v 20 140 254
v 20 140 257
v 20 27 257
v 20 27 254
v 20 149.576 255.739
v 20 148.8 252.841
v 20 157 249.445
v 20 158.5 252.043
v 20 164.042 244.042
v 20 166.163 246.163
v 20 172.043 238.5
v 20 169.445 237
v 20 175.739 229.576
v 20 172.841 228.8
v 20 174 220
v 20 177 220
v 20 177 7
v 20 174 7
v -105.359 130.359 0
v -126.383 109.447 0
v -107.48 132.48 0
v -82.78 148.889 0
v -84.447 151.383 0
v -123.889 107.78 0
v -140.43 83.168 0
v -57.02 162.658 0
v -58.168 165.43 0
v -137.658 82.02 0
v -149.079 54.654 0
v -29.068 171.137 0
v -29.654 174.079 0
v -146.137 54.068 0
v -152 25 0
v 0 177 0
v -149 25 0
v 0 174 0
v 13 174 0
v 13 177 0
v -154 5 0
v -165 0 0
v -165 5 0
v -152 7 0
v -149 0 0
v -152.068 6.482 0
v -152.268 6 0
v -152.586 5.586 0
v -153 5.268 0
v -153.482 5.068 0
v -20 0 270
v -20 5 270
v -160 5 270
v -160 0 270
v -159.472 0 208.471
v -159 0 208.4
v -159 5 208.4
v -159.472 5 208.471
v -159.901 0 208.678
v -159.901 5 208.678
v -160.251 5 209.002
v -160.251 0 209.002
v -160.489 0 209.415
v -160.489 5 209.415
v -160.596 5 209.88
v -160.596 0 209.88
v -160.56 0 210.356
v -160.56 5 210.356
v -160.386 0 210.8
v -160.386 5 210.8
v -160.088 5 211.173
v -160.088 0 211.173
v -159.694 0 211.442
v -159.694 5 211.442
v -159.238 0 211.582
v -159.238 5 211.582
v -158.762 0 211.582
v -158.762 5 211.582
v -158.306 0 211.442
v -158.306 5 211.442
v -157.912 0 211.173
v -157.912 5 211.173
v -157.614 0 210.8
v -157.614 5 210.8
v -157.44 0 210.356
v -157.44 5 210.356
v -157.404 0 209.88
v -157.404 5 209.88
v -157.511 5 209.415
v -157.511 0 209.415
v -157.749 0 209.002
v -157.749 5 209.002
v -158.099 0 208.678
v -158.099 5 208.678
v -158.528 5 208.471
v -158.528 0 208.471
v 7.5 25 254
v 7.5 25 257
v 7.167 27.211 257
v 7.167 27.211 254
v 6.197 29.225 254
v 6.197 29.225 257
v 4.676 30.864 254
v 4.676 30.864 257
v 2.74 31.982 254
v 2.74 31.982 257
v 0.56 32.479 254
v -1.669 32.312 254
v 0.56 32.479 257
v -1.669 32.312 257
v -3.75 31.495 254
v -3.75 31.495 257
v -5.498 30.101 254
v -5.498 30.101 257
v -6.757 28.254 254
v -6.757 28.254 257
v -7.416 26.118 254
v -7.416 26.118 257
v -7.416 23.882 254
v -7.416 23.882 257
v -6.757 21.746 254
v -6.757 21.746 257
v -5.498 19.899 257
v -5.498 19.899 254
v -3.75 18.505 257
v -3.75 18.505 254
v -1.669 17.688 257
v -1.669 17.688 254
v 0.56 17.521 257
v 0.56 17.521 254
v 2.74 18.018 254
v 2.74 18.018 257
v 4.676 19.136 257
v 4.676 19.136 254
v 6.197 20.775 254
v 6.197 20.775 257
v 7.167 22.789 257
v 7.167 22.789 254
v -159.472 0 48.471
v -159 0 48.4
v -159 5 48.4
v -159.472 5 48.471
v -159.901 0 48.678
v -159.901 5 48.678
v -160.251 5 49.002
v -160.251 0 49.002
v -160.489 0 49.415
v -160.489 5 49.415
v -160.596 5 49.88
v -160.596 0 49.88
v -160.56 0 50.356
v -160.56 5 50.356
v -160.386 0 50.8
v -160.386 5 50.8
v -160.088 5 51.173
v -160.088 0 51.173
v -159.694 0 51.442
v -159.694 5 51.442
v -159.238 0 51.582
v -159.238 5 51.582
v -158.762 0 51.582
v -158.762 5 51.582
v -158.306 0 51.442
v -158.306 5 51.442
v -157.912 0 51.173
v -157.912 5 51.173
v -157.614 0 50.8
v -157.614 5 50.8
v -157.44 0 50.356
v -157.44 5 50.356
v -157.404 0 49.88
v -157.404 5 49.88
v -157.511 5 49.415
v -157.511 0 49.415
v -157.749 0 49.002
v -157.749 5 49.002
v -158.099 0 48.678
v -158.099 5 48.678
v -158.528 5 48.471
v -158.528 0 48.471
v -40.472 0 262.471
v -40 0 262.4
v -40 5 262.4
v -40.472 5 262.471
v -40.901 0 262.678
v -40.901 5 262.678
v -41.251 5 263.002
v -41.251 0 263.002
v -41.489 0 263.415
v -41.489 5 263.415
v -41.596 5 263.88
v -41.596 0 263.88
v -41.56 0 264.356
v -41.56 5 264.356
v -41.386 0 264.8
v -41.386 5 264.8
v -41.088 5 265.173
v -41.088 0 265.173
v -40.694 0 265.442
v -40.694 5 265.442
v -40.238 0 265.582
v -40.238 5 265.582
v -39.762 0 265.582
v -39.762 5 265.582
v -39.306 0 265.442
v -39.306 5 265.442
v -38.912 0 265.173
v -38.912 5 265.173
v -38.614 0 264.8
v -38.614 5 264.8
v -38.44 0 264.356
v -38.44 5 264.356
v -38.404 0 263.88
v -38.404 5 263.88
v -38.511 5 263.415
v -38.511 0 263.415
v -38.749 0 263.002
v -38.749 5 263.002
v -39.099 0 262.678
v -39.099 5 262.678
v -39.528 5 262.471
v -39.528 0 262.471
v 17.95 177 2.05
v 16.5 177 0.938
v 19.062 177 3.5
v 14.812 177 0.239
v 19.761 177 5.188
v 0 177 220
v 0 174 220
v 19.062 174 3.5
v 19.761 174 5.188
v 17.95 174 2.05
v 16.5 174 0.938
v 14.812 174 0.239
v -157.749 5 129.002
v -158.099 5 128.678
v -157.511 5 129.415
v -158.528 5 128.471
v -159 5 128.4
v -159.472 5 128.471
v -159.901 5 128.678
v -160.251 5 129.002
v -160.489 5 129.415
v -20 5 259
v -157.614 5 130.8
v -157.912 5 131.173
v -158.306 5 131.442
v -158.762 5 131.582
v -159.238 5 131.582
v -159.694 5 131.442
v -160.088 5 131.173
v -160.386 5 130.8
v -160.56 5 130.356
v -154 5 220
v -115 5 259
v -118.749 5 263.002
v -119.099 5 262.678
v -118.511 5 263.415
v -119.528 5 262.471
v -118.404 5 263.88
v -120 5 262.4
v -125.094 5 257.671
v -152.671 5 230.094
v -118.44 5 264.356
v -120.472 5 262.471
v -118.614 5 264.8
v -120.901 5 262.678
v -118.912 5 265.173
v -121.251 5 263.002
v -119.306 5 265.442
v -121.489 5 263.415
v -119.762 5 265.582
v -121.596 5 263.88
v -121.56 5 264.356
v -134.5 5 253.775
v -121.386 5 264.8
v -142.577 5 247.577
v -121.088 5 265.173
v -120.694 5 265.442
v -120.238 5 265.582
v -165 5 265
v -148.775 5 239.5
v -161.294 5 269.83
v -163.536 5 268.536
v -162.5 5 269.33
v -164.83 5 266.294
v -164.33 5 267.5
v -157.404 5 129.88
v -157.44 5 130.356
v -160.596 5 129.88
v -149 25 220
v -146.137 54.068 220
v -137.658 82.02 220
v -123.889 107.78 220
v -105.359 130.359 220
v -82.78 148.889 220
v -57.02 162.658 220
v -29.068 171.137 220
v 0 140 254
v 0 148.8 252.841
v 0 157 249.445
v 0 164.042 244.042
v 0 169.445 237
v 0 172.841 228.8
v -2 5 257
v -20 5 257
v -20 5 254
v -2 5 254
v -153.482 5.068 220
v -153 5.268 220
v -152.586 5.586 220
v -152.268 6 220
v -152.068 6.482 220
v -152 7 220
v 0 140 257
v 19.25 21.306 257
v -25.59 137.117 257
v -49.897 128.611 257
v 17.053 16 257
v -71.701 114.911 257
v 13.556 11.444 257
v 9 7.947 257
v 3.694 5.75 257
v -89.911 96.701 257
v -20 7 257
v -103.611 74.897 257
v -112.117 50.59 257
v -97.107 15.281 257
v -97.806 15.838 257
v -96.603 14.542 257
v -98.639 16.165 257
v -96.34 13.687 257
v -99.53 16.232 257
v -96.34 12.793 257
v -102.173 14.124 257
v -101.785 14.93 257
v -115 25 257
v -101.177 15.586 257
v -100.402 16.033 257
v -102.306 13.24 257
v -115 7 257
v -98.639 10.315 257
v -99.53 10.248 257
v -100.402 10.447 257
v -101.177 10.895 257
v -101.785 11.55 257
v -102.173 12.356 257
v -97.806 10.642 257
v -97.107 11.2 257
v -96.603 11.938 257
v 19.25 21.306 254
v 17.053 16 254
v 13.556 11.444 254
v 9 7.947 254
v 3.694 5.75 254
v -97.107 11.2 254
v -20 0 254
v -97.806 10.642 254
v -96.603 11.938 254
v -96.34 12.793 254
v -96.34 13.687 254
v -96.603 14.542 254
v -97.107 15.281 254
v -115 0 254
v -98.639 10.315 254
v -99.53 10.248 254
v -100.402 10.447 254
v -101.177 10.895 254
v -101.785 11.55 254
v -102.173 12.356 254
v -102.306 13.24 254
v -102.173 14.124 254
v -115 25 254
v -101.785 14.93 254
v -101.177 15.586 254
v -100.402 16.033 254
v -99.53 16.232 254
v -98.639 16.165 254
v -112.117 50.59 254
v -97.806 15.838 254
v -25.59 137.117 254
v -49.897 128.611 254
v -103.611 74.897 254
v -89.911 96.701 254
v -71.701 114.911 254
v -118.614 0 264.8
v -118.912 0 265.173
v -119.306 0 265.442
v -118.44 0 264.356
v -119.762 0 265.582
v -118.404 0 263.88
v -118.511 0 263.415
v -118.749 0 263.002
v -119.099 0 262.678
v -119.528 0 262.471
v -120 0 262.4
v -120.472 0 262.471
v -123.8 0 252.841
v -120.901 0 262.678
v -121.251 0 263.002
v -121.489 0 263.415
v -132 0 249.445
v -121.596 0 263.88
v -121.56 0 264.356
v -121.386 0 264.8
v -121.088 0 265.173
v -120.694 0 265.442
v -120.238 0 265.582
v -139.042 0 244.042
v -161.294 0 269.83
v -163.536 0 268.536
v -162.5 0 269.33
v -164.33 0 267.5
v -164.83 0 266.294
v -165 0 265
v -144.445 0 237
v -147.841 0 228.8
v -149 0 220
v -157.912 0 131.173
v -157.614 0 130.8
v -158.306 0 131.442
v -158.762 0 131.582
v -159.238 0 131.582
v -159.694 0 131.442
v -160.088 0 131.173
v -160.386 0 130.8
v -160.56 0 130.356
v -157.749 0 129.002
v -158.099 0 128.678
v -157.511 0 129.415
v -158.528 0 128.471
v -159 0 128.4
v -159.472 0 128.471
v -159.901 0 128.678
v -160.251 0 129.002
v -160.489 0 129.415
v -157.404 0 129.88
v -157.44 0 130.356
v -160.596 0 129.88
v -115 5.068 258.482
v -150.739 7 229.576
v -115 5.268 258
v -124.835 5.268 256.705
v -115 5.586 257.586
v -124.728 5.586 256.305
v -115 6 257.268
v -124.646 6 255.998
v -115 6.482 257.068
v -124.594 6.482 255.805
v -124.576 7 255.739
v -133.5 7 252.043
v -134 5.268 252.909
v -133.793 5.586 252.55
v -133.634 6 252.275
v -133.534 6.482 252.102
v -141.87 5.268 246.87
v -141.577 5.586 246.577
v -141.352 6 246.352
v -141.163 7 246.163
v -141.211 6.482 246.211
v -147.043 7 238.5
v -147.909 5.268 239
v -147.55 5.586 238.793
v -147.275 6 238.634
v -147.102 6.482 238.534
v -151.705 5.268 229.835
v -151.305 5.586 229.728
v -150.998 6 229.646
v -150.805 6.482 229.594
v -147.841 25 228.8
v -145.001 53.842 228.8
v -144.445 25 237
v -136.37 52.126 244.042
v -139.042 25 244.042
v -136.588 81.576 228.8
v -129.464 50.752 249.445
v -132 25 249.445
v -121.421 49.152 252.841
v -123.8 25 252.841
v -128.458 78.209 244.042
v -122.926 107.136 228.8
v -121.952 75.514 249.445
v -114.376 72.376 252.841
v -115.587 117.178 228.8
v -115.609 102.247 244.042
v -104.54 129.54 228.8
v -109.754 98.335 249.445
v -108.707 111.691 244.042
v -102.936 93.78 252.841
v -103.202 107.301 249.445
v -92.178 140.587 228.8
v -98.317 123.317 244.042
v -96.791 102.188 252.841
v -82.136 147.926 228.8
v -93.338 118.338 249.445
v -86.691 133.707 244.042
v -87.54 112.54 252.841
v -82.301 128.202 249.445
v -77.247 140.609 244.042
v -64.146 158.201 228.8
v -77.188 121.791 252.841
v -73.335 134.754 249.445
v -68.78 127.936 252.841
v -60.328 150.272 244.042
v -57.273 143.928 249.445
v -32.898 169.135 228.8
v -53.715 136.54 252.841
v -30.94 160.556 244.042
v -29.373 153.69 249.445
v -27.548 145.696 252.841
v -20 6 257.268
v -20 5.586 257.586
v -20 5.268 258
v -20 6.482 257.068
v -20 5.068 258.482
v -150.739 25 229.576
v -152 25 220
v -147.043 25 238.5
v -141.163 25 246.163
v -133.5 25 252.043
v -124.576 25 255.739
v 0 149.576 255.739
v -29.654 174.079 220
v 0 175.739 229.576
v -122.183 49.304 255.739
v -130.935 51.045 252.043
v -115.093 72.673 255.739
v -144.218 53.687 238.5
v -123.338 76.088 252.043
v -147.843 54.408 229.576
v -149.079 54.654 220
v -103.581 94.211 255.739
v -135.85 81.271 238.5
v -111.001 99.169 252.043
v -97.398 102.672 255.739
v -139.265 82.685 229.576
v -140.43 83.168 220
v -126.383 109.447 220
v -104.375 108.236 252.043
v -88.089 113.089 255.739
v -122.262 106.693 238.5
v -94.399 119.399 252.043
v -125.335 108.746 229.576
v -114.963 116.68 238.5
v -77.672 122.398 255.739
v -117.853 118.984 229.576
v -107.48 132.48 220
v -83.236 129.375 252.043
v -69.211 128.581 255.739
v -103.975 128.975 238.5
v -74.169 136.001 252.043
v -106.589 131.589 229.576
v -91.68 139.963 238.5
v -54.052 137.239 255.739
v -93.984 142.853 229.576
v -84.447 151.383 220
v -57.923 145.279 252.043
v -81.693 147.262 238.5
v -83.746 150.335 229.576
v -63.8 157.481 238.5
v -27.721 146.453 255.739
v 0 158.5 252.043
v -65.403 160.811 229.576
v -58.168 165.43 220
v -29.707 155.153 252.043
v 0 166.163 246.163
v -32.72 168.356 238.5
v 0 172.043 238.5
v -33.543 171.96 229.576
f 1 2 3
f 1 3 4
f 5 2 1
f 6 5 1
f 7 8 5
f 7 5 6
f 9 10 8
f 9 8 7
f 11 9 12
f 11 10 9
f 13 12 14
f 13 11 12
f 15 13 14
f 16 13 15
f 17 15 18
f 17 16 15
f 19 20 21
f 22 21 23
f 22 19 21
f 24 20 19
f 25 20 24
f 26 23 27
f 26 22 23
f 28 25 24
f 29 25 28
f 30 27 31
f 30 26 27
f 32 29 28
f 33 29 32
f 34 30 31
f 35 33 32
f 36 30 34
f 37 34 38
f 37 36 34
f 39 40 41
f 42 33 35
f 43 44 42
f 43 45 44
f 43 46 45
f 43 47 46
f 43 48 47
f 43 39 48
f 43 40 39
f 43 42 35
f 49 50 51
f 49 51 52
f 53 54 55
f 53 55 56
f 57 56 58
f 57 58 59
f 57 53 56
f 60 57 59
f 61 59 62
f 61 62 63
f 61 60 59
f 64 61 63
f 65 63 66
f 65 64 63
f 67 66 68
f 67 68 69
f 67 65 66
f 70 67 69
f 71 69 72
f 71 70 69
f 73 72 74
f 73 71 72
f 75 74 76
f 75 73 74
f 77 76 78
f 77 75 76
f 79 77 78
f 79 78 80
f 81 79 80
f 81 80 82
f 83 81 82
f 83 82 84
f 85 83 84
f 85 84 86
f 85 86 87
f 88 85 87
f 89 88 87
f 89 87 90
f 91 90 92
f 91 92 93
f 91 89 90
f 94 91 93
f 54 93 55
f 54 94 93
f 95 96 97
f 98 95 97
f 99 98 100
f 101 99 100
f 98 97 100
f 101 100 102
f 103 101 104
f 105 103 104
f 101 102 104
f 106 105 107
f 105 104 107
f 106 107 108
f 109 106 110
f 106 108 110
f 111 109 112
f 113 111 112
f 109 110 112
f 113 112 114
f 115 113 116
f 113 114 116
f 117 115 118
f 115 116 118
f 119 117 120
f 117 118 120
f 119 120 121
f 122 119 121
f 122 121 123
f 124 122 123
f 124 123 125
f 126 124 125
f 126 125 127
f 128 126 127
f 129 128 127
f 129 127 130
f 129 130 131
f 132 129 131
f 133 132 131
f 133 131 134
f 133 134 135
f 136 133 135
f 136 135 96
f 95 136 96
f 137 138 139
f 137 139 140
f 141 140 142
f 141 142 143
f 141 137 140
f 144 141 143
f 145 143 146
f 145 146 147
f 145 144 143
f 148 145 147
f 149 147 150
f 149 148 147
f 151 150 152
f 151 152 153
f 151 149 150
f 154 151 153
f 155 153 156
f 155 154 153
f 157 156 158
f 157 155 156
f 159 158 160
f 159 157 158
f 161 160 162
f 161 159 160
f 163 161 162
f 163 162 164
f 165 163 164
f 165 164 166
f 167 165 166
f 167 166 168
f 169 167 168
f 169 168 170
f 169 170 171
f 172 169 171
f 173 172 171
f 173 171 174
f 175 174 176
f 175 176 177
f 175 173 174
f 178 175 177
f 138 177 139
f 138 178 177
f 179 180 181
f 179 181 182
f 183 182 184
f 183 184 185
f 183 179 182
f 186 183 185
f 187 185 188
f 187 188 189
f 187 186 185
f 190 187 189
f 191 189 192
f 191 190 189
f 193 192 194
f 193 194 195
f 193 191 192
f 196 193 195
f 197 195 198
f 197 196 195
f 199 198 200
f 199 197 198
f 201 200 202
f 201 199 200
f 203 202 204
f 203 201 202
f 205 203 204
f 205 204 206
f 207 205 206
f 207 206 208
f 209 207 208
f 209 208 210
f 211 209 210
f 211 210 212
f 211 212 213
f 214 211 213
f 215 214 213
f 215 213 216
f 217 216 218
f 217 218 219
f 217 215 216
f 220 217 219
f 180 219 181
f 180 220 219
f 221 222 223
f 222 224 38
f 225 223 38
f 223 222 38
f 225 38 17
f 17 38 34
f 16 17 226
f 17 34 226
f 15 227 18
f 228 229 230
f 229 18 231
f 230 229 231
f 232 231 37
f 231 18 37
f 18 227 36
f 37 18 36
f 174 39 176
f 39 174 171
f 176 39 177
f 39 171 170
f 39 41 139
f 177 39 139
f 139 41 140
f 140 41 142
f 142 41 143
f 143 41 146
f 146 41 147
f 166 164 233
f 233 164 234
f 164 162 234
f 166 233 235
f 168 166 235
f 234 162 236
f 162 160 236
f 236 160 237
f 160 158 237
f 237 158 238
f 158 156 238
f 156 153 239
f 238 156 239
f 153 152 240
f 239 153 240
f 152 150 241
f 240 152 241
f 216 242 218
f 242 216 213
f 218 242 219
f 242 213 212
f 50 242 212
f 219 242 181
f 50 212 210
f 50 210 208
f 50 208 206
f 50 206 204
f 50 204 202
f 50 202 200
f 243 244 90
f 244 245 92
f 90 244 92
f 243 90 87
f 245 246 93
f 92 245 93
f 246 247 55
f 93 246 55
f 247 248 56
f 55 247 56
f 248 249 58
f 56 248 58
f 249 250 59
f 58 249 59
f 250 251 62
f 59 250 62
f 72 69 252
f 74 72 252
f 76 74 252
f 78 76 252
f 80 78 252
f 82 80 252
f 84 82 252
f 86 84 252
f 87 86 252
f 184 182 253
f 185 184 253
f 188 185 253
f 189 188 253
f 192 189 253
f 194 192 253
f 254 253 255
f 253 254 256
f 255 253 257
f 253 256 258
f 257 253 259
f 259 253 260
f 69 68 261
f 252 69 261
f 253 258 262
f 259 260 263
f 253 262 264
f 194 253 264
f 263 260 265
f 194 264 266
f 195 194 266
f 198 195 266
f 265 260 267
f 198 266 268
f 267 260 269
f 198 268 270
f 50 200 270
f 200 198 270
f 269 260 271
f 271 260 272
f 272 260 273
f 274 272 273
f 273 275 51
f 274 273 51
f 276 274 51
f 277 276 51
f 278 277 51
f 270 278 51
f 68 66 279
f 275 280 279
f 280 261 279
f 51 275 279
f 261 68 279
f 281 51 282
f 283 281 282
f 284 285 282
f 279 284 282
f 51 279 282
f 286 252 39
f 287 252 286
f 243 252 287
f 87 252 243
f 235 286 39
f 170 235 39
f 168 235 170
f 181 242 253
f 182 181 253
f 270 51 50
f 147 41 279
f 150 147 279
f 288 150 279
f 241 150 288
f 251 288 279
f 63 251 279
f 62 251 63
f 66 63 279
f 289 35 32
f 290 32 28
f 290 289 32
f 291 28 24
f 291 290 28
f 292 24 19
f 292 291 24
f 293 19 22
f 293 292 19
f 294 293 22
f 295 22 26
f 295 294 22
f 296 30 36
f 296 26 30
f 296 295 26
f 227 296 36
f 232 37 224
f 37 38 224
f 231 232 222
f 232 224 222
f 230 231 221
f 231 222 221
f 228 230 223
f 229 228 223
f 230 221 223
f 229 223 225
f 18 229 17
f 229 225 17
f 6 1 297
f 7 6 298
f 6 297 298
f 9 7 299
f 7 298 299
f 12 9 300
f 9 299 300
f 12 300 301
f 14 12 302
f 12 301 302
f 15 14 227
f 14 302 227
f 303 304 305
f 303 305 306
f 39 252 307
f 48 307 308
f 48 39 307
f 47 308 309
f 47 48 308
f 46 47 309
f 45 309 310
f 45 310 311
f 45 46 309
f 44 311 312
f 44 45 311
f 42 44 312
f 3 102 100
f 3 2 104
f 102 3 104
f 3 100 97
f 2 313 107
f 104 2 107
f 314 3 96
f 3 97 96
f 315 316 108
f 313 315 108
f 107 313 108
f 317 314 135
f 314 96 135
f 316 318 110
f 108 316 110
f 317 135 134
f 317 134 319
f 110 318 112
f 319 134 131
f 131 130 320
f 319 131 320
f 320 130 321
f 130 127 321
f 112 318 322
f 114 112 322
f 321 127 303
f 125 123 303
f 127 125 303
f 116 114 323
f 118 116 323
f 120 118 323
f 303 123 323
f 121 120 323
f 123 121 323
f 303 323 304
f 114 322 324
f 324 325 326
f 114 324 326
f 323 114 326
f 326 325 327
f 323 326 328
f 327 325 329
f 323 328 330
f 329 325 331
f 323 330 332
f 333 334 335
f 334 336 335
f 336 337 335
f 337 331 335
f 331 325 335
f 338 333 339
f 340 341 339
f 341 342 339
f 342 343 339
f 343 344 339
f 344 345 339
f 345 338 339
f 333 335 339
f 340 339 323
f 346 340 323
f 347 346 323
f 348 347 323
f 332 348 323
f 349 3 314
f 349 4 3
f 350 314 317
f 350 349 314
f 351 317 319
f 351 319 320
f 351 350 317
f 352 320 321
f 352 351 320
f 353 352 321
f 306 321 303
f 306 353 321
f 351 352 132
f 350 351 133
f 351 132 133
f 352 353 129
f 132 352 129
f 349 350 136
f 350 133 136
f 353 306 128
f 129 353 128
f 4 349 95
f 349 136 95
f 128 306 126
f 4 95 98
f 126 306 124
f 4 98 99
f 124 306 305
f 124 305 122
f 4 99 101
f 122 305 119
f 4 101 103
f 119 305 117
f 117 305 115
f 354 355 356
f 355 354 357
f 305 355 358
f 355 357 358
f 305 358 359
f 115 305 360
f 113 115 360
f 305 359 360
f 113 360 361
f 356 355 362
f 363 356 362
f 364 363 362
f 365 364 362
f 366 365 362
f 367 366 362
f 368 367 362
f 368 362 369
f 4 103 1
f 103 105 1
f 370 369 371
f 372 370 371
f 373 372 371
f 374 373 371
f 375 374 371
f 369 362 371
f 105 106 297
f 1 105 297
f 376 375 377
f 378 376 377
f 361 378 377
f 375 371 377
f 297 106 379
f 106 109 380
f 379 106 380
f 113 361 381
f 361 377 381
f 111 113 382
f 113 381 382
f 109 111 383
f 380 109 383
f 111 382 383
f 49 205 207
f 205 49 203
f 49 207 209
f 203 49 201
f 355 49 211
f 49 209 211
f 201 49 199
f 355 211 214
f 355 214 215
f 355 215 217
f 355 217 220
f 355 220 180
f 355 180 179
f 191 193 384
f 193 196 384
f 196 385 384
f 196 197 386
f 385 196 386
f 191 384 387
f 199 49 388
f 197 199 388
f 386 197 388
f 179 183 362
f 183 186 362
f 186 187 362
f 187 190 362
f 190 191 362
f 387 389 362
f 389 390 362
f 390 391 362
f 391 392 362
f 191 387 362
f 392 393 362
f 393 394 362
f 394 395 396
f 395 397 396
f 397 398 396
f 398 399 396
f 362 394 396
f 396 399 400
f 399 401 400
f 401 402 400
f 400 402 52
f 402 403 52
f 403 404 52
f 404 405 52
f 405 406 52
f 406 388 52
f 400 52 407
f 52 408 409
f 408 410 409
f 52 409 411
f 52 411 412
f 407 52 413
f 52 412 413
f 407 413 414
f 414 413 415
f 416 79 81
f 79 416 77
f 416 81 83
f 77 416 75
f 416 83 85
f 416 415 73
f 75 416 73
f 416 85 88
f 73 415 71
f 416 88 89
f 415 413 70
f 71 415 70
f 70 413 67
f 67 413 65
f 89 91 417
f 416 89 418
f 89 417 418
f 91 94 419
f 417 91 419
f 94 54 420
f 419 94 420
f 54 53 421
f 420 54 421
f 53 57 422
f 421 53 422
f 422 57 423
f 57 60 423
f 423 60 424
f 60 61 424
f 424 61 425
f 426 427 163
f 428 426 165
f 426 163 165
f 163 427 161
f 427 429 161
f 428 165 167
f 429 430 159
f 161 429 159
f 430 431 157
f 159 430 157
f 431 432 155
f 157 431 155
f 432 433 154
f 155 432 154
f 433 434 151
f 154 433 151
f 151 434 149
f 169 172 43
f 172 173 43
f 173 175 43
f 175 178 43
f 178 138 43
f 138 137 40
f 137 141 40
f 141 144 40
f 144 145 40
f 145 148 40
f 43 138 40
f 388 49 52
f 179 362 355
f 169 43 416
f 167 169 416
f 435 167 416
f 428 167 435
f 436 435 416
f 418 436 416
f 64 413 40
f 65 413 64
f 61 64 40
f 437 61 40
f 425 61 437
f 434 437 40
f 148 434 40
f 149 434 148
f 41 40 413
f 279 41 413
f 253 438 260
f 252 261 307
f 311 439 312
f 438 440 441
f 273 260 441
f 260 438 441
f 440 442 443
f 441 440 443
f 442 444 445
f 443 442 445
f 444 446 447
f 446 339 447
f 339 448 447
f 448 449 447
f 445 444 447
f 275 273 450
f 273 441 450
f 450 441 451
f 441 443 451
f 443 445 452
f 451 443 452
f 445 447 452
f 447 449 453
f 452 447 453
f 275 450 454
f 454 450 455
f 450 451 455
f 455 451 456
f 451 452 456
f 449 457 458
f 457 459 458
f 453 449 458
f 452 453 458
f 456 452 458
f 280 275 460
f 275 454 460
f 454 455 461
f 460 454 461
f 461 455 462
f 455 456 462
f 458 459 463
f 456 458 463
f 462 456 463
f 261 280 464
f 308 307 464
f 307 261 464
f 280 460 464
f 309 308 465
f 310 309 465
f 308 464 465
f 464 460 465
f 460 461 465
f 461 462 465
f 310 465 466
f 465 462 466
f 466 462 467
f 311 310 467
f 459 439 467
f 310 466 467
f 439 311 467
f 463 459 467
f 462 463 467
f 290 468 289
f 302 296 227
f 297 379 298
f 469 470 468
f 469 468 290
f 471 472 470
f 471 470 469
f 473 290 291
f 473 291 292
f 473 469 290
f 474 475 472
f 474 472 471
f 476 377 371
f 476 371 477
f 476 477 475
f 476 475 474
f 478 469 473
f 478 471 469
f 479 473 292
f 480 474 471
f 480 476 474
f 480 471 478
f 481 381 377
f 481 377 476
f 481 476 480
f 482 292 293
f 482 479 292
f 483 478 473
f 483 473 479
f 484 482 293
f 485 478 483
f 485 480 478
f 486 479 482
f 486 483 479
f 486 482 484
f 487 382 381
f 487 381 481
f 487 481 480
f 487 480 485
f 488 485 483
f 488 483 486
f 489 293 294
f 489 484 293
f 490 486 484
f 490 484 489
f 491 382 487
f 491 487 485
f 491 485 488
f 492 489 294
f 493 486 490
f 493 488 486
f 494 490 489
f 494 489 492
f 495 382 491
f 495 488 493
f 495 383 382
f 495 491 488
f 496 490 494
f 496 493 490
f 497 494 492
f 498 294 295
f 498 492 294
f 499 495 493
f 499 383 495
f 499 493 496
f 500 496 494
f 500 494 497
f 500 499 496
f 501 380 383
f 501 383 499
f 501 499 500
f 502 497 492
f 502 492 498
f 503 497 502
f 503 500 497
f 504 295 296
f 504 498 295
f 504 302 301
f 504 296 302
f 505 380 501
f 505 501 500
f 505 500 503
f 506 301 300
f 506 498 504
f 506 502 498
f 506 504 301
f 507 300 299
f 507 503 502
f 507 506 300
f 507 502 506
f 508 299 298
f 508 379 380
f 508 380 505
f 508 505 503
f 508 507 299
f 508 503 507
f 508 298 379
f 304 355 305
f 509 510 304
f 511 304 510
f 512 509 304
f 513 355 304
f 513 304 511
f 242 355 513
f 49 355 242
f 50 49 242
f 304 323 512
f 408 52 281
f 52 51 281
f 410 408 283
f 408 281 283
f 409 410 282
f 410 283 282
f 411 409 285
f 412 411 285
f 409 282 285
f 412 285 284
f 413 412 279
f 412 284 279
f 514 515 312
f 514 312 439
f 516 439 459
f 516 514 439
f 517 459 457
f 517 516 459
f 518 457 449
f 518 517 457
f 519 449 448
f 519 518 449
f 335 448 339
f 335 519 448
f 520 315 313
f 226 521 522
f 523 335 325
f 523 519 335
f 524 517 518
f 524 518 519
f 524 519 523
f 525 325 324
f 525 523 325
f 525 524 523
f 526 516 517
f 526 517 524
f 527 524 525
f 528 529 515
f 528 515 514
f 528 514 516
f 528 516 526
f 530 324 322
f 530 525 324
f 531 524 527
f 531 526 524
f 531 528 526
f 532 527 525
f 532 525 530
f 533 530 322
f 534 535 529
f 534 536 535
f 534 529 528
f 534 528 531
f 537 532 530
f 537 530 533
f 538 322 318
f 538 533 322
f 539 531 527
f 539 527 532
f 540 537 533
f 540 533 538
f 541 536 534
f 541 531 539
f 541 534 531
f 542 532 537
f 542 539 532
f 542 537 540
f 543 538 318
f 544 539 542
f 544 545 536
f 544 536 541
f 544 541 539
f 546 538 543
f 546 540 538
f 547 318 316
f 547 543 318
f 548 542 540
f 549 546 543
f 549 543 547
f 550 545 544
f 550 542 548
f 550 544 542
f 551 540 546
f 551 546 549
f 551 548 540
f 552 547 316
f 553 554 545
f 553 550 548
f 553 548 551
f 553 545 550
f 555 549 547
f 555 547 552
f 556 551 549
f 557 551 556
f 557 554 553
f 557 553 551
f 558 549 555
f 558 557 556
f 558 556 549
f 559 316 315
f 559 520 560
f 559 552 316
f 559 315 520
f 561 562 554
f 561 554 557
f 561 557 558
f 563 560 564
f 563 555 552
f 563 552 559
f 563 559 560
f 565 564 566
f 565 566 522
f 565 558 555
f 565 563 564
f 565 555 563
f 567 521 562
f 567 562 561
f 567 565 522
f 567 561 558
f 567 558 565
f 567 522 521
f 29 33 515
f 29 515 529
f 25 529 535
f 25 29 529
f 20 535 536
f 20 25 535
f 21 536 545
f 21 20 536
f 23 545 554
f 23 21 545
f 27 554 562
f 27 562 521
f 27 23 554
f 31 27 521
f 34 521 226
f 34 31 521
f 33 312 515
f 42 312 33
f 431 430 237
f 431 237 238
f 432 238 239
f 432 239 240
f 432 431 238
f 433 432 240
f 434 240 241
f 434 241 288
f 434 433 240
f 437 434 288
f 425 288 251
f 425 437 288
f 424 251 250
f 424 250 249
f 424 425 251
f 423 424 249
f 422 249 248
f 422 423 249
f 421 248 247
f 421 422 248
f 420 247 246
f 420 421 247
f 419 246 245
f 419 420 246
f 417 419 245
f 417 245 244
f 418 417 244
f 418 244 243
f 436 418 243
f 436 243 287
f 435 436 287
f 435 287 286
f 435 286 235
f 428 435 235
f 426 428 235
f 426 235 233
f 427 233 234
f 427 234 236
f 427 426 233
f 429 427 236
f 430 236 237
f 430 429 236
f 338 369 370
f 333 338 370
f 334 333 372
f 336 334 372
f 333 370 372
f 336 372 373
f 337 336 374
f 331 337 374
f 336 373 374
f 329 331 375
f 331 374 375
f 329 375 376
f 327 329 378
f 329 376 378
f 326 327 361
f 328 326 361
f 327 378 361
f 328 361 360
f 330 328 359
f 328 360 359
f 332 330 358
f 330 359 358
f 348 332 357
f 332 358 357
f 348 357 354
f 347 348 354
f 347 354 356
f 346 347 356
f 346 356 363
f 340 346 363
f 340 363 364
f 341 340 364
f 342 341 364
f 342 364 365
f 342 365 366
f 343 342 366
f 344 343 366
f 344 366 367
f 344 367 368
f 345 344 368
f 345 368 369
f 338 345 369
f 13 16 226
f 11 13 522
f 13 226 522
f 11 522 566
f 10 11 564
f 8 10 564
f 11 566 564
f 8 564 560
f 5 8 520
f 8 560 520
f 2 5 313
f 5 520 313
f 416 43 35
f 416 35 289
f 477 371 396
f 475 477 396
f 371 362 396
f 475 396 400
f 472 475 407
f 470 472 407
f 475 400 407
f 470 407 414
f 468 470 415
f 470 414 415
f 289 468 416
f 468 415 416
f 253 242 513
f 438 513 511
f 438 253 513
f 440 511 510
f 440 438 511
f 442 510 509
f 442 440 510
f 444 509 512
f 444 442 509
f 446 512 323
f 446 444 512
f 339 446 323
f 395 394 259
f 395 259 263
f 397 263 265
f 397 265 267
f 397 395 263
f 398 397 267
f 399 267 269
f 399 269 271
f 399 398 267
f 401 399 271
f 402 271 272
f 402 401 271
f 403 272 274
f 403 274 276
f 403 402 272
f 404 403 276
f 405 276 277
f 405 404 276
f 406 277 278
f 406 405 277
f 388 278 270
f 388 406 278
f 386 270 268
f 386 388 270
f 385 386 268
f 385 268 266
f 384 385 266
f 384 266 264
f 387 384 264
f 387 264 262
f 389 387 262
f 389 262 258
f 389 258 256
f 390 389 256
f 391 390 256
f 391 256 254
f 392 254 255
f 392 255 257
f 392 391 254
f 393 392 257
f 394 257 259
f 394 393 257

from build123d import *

# Parameters (mm, degrees)
SKETCH1_R           = 1.6
BOSS_EXTRUDE1_DEPTH = 5
BOSS_EXTRUDE5_DEPTH = 20
FILLET8_R           = 34
FILLET9_R           = 37
REVOLVE4_ANGLE      = 90
BOSS_EXTRUDE6_DEPTH = 20
CUT_EXTRUDE3_REACH  = 593.738
SKETCH16_W          = 40
SKETCH16_H          = 5
FILLET10_R          = 22
CUT_EXTRUDE4_REACH  = 581.899
SKETCH17_R          = 7.5
FILLET11_R          = 5
FILLET12_R          = 2
CUT_EXTRUDE5_REACH  = 581.899
SKETCH18_R          = 3
SKETCH19_W          = 201.306473633
SKETCH19_H          = 285.537776223
CUT_EXTRUDE6_DEPTH  = 269
FILLET13_R          = 7


with BuildPart() as part:
    # Sketch1 → Boss-Extrude1 (new body)
    with BuildSketch(Plane(origin=(0, 0, 0), x_dir=(1, 0, 0), z_dir=(0, 1, 0))):
        Polygon((-165, 270), (-165, -270), (0, -270), (0, -254), (-149, -254), (-149, 254), (0, 254), (0, 270), align=None)
        with Locations(Location((-159, 130, 0), (0, 0, 270))):
            Circle(SKETCH1_R, mode=Mode.SUBTRACT)
        with Locations(Location((-159, 50, 0), (0, 0, 270))):
            Circle(SKETCH1_R, mode=Mode.SUBTRACT)
        with Locations(Location((-120, 264, 0), (0, 0, 270))):
            Circle(SKETCH1_R, mode=Mode.SUBTRACT)
        with Locations(Location((-40, 264, 0), (0, 0, 270))):
            Circle(SKETCH1_R, mode=Mode.SUBTRACT)
        with Locations(Location((-159, 210, 0), (0, 0, 270))):
            Circle(SKETCH1_R, mode=Mode.SUBTRACT)
        with Locations(Location((-40, -264, 0), (0, 0, 90))):
            Circle(SKETCH1_R, mode=Mode.SUBTRACT)
        with Locations(Location((-120, -264, 0), (0, 0, 90))):
            Circle(SKETCH1_R, mode=Mode.SUBTRACT)
        with Locations(Location((-159, -210, 0), (0, 0, 90))):
            Circle(SKETCH1_R, mode=Mode.SUBTRACT)
        with Locations(Location((-159, -50, 0), (0, 0, 90))):
            Circle(SKETCH1_R, mode=Mode.SUBTRACT)
        with Locations(Location((-159, -130, 0), (0, 0, 90))):
            Circle(SKETCH1_R, mode=Mode.SUBTRACT)
    extrude(amount=BOSS_EXTRUDE1_DEPTH)

    # Sketch12 → Boss-Extrude5 (add)
    with BuildSketch(Plane(origin=(0, 5, 0), x_dir=(1, 0, 0), z_dir=(0, 1, 0))):
        Polygon((0, 254), (-149, 254), (-149, -254), (0, -254), (0, -257), (-152, -257), (-152, 257), (0, 257), align=None)
    extrude(amount=BOSS_EXTRUDE5_DEPTH)

    # Fillet8
    fillet8_edges = [part.edges().sort_by_distance(p)[0] for p in [
        (-149, 12.5, -254),
        (-149, 12.5, 254),
    ]]
    fillet(fillet8_edges, radius=FILLET8_R)

    # Fillet9
    fillet9_edges = [part.edges().sort_by_distance(p)[0] for p in [
        (-152, 15, -257),
        (-152, 15, 257),
    ]]
    fillet(fillet9_edges, radius=FILLET9_R)

    # Sketch13 → Revolve4 (revolve)
    with BuildSketch(Plane(origin=(0, 25, 0), x_dir=(1, 0, 0), z_dir=(0, 1, 0))):
        with BuildLine():
            Line((0, 254), (-115, 254))
            ThreePointArc((-115, 254), (-139.04163056, 244.04163056), (-149, 220))
            Line((-149, 220), (-149, -220))
            ThreePointArc((-149, -220), (-139.04163056, -244.04163056), (-115, -254))
            Line((-115, -254), (0, -254))
            Line((0, -254), (0, -257))
            Line((0, -257), (-115, -257))
            ThreePointArc((-115, -257), (-141.162950904, -246.162950904), (-152, -220))
            Line((-152, -220), (-152, 220))
            ThreePointArc((-152, 220), (-141.162950904, 246.162950904), (-115, 257))
            Line((-115, 257), (0, 257))
            Line((0, 257), (0, 254))
        make_face()
    revolve(axis=Axis((0, 25, -257), (0, 0, -1)), revolution_arc=REVOLVE4_ANGLE)

    # Sketch15 → Boss-Extrude6 (add)
    with BuildSketch(Plane(origin=(0, 0, 0), x_dir=(0, 0, -1), z_dir=(1, 0, 0))):
        with BuildLine():
            Line((-254, 5), (-254, 140))
            ThreePointArc((-254, 140), (-244.04163056, 164.04163056), (-220, 174))
            Line((-220, 174), (220, 174))
            ThreePointArc((220, 174), (244.04163056, 164.04163056), (254, 140))
            Line((254, 140), (254, 5))
            Line((254, 5), (254, 0))
            Line((254, 0), (270, 0))
            Line((270, 0), (270, 5))
            Line((270, 5), (257, 5))
            Line((257, 5), (257, 140))
            ThreePointArc((257, 140), (246.162950904, 166.162950904), (220, 177))
            Line((220, 177), (-220, 177))
            ThreePointArc((-220, 177), (-246.162950904, 166.162950904), (-257, 140))
            Line((-257, 140), (-257, 5))
            Line((-257, 5), (-270, 5))
            Line((-270, 5), (-270, 0))
            Line((-270, 0), (-254, 0))
            Line((-254, 0), (-254, 5))
        make_face()
    extrude(amount=BOSS_EXTRUDE6_DEPTH)

    # Cut-Extrude3: up to this face of the body (flat: up to its plane)
    cut_extrude3_end = Plane(part.part.faces().sort_by_distance((-72.5, 2.5, -270))[0])
    # Sketch16 → Cut-Extrude3 (cut, up to the picked face)
    with BuildSketch(Plane.XY.offset(270), mode=Mode.PRIVATE) as cut_extrude3_sk1:
        with Locations((0, 2.5)):
            Rectangle(SKETCH16_W, SKETCH16_H)
    cut_extrude3_tool1 = split(extrude(cut_extrude3_sk1.sketch, amount=-CUT_EXTRUDE3_REACH, mode=Mode.PRIVATE), bisect_by=cut_extrude3_end, keep=Keep.BOTH, mode=Mode.PRIVATE)
    add(cut_extrude3_tool1.solids().sort_by(Axis((0, 2.5, 270), (0, 0, -1)))[0], mode=Mode.SUBTRACT)

    # Fillet10
    fillet10_edges = [part.edges().sort_by_distance(p)[0] for p in [
        (20, 5, 255.5),
        (20, 5, -255.5),
    ]]
    fillet(fillet10_edges, radius=FILLET10_R)

    # Cut-Extrude4: up to this face of the body (flat: up to its plane)
    cut_extrude4_end = Plane(part.part.faces().sort_by_distance((-40.16059182, 65.16059182, -257))[0])
    # Sketch17 → Cut-Extrude4 (cut, up to the picked face)
    with BuildSketch(Plane.XY.offset(257), mode=Mode.PRIVATE) as cut_extrude4_sk1:
        with Locations((0, 25)):
            Circle(SKETCH17_R)
    cut_extrude4_tool1 = split(extrude(cut_extrude4_sk1.sketch, amount=-CUT_EXTRUDE4_REACH, mode=Mode.PRIVATE), bisect_by=cut_extrude4_end, keep=Keep.BOTH, mode=Mode.PRIVATE)
    add(cut_extrude4_tool1.solids().sort_by(Axis((0, 25, 257), (0, 0, -1)))[0], mode=Mode.SUBTRACT)

    # Fillet11
    fillet11_edges = [part.edges().sort_by_distance(p)[0] for p in [
        (-165, 2.5, 270),
        (-165, 2.5, -270),
    ]]
    fillet(fillet11_edges, radius=FILLET11_R)

    # Fillet12
    fillet12_edges = [part.edges().sort_by_distance(p)[0] for p in [
        (-152, 5, 0),
        (-67.5, 5, 257),
        (-141.162950904, 5, -246.162950904),
        (-141.162950904, 5, 246.162950904),
        (-67.5, 5, -257),
    ]]
    fillet(fillet12_edges, radius=FILLET12_R)

    # Cut-Extrude5: up to this face of the body (flat: up to its plane)
    cut_extrude5_end = Plane(part.part.faces().sort_by_distance((-40.288135092, 66.389949232, 257))[0])
    # Sketch18 → Cut-Extrude5 (cut, up to the picked face)
    with BuildSketch(Plane(origin=(0, 0, -257), x_dir=(-1, 0, 0), z_dir=(0, 0, -1)), mode=Mode.PRIVATE) as cut_extrude5_sk1:
        with Locations((99.306112319, 13.240065646)):
            Circle(SKETCH18_R)
    cut_extrude5_tool1 = split(extrude(cut_extrude5_sk1.sketch, amount=-CUT_EXTRUDE5_REACH, mode=Mode.PRIVATE), bisect_by=cut_extrude5_end, keep=Keep.BOTH, mode=Mode.PRIVATE)
    add(cut_extrude5_tool1.solids().sort_by(Axis((-99.306112, 13.240066, -257), (0, 0, 1)))[0], mode=Mode.SUBTRACT)

    # Sketch19 → Cut-Extrude6 (cut)
    with BuildSketch(Plane.XZ):
        with Locations((-80.653236817, -142.768888112)):
            Rectangle(SKETCH19_W, SKETCH19_H)
    extrude(amount=-CUT_EXTRUDE6_DEPTH, mode=Mode.SUBTRACT)

    # Fillet13
    fillet13_edges = [part.edges().sort_by_distance(p)[0] for p in [
        (20, 175.5, 0),
    ]]
    fillet(fillet13_edges, radius=FILLET13_R)


solid = part.part
